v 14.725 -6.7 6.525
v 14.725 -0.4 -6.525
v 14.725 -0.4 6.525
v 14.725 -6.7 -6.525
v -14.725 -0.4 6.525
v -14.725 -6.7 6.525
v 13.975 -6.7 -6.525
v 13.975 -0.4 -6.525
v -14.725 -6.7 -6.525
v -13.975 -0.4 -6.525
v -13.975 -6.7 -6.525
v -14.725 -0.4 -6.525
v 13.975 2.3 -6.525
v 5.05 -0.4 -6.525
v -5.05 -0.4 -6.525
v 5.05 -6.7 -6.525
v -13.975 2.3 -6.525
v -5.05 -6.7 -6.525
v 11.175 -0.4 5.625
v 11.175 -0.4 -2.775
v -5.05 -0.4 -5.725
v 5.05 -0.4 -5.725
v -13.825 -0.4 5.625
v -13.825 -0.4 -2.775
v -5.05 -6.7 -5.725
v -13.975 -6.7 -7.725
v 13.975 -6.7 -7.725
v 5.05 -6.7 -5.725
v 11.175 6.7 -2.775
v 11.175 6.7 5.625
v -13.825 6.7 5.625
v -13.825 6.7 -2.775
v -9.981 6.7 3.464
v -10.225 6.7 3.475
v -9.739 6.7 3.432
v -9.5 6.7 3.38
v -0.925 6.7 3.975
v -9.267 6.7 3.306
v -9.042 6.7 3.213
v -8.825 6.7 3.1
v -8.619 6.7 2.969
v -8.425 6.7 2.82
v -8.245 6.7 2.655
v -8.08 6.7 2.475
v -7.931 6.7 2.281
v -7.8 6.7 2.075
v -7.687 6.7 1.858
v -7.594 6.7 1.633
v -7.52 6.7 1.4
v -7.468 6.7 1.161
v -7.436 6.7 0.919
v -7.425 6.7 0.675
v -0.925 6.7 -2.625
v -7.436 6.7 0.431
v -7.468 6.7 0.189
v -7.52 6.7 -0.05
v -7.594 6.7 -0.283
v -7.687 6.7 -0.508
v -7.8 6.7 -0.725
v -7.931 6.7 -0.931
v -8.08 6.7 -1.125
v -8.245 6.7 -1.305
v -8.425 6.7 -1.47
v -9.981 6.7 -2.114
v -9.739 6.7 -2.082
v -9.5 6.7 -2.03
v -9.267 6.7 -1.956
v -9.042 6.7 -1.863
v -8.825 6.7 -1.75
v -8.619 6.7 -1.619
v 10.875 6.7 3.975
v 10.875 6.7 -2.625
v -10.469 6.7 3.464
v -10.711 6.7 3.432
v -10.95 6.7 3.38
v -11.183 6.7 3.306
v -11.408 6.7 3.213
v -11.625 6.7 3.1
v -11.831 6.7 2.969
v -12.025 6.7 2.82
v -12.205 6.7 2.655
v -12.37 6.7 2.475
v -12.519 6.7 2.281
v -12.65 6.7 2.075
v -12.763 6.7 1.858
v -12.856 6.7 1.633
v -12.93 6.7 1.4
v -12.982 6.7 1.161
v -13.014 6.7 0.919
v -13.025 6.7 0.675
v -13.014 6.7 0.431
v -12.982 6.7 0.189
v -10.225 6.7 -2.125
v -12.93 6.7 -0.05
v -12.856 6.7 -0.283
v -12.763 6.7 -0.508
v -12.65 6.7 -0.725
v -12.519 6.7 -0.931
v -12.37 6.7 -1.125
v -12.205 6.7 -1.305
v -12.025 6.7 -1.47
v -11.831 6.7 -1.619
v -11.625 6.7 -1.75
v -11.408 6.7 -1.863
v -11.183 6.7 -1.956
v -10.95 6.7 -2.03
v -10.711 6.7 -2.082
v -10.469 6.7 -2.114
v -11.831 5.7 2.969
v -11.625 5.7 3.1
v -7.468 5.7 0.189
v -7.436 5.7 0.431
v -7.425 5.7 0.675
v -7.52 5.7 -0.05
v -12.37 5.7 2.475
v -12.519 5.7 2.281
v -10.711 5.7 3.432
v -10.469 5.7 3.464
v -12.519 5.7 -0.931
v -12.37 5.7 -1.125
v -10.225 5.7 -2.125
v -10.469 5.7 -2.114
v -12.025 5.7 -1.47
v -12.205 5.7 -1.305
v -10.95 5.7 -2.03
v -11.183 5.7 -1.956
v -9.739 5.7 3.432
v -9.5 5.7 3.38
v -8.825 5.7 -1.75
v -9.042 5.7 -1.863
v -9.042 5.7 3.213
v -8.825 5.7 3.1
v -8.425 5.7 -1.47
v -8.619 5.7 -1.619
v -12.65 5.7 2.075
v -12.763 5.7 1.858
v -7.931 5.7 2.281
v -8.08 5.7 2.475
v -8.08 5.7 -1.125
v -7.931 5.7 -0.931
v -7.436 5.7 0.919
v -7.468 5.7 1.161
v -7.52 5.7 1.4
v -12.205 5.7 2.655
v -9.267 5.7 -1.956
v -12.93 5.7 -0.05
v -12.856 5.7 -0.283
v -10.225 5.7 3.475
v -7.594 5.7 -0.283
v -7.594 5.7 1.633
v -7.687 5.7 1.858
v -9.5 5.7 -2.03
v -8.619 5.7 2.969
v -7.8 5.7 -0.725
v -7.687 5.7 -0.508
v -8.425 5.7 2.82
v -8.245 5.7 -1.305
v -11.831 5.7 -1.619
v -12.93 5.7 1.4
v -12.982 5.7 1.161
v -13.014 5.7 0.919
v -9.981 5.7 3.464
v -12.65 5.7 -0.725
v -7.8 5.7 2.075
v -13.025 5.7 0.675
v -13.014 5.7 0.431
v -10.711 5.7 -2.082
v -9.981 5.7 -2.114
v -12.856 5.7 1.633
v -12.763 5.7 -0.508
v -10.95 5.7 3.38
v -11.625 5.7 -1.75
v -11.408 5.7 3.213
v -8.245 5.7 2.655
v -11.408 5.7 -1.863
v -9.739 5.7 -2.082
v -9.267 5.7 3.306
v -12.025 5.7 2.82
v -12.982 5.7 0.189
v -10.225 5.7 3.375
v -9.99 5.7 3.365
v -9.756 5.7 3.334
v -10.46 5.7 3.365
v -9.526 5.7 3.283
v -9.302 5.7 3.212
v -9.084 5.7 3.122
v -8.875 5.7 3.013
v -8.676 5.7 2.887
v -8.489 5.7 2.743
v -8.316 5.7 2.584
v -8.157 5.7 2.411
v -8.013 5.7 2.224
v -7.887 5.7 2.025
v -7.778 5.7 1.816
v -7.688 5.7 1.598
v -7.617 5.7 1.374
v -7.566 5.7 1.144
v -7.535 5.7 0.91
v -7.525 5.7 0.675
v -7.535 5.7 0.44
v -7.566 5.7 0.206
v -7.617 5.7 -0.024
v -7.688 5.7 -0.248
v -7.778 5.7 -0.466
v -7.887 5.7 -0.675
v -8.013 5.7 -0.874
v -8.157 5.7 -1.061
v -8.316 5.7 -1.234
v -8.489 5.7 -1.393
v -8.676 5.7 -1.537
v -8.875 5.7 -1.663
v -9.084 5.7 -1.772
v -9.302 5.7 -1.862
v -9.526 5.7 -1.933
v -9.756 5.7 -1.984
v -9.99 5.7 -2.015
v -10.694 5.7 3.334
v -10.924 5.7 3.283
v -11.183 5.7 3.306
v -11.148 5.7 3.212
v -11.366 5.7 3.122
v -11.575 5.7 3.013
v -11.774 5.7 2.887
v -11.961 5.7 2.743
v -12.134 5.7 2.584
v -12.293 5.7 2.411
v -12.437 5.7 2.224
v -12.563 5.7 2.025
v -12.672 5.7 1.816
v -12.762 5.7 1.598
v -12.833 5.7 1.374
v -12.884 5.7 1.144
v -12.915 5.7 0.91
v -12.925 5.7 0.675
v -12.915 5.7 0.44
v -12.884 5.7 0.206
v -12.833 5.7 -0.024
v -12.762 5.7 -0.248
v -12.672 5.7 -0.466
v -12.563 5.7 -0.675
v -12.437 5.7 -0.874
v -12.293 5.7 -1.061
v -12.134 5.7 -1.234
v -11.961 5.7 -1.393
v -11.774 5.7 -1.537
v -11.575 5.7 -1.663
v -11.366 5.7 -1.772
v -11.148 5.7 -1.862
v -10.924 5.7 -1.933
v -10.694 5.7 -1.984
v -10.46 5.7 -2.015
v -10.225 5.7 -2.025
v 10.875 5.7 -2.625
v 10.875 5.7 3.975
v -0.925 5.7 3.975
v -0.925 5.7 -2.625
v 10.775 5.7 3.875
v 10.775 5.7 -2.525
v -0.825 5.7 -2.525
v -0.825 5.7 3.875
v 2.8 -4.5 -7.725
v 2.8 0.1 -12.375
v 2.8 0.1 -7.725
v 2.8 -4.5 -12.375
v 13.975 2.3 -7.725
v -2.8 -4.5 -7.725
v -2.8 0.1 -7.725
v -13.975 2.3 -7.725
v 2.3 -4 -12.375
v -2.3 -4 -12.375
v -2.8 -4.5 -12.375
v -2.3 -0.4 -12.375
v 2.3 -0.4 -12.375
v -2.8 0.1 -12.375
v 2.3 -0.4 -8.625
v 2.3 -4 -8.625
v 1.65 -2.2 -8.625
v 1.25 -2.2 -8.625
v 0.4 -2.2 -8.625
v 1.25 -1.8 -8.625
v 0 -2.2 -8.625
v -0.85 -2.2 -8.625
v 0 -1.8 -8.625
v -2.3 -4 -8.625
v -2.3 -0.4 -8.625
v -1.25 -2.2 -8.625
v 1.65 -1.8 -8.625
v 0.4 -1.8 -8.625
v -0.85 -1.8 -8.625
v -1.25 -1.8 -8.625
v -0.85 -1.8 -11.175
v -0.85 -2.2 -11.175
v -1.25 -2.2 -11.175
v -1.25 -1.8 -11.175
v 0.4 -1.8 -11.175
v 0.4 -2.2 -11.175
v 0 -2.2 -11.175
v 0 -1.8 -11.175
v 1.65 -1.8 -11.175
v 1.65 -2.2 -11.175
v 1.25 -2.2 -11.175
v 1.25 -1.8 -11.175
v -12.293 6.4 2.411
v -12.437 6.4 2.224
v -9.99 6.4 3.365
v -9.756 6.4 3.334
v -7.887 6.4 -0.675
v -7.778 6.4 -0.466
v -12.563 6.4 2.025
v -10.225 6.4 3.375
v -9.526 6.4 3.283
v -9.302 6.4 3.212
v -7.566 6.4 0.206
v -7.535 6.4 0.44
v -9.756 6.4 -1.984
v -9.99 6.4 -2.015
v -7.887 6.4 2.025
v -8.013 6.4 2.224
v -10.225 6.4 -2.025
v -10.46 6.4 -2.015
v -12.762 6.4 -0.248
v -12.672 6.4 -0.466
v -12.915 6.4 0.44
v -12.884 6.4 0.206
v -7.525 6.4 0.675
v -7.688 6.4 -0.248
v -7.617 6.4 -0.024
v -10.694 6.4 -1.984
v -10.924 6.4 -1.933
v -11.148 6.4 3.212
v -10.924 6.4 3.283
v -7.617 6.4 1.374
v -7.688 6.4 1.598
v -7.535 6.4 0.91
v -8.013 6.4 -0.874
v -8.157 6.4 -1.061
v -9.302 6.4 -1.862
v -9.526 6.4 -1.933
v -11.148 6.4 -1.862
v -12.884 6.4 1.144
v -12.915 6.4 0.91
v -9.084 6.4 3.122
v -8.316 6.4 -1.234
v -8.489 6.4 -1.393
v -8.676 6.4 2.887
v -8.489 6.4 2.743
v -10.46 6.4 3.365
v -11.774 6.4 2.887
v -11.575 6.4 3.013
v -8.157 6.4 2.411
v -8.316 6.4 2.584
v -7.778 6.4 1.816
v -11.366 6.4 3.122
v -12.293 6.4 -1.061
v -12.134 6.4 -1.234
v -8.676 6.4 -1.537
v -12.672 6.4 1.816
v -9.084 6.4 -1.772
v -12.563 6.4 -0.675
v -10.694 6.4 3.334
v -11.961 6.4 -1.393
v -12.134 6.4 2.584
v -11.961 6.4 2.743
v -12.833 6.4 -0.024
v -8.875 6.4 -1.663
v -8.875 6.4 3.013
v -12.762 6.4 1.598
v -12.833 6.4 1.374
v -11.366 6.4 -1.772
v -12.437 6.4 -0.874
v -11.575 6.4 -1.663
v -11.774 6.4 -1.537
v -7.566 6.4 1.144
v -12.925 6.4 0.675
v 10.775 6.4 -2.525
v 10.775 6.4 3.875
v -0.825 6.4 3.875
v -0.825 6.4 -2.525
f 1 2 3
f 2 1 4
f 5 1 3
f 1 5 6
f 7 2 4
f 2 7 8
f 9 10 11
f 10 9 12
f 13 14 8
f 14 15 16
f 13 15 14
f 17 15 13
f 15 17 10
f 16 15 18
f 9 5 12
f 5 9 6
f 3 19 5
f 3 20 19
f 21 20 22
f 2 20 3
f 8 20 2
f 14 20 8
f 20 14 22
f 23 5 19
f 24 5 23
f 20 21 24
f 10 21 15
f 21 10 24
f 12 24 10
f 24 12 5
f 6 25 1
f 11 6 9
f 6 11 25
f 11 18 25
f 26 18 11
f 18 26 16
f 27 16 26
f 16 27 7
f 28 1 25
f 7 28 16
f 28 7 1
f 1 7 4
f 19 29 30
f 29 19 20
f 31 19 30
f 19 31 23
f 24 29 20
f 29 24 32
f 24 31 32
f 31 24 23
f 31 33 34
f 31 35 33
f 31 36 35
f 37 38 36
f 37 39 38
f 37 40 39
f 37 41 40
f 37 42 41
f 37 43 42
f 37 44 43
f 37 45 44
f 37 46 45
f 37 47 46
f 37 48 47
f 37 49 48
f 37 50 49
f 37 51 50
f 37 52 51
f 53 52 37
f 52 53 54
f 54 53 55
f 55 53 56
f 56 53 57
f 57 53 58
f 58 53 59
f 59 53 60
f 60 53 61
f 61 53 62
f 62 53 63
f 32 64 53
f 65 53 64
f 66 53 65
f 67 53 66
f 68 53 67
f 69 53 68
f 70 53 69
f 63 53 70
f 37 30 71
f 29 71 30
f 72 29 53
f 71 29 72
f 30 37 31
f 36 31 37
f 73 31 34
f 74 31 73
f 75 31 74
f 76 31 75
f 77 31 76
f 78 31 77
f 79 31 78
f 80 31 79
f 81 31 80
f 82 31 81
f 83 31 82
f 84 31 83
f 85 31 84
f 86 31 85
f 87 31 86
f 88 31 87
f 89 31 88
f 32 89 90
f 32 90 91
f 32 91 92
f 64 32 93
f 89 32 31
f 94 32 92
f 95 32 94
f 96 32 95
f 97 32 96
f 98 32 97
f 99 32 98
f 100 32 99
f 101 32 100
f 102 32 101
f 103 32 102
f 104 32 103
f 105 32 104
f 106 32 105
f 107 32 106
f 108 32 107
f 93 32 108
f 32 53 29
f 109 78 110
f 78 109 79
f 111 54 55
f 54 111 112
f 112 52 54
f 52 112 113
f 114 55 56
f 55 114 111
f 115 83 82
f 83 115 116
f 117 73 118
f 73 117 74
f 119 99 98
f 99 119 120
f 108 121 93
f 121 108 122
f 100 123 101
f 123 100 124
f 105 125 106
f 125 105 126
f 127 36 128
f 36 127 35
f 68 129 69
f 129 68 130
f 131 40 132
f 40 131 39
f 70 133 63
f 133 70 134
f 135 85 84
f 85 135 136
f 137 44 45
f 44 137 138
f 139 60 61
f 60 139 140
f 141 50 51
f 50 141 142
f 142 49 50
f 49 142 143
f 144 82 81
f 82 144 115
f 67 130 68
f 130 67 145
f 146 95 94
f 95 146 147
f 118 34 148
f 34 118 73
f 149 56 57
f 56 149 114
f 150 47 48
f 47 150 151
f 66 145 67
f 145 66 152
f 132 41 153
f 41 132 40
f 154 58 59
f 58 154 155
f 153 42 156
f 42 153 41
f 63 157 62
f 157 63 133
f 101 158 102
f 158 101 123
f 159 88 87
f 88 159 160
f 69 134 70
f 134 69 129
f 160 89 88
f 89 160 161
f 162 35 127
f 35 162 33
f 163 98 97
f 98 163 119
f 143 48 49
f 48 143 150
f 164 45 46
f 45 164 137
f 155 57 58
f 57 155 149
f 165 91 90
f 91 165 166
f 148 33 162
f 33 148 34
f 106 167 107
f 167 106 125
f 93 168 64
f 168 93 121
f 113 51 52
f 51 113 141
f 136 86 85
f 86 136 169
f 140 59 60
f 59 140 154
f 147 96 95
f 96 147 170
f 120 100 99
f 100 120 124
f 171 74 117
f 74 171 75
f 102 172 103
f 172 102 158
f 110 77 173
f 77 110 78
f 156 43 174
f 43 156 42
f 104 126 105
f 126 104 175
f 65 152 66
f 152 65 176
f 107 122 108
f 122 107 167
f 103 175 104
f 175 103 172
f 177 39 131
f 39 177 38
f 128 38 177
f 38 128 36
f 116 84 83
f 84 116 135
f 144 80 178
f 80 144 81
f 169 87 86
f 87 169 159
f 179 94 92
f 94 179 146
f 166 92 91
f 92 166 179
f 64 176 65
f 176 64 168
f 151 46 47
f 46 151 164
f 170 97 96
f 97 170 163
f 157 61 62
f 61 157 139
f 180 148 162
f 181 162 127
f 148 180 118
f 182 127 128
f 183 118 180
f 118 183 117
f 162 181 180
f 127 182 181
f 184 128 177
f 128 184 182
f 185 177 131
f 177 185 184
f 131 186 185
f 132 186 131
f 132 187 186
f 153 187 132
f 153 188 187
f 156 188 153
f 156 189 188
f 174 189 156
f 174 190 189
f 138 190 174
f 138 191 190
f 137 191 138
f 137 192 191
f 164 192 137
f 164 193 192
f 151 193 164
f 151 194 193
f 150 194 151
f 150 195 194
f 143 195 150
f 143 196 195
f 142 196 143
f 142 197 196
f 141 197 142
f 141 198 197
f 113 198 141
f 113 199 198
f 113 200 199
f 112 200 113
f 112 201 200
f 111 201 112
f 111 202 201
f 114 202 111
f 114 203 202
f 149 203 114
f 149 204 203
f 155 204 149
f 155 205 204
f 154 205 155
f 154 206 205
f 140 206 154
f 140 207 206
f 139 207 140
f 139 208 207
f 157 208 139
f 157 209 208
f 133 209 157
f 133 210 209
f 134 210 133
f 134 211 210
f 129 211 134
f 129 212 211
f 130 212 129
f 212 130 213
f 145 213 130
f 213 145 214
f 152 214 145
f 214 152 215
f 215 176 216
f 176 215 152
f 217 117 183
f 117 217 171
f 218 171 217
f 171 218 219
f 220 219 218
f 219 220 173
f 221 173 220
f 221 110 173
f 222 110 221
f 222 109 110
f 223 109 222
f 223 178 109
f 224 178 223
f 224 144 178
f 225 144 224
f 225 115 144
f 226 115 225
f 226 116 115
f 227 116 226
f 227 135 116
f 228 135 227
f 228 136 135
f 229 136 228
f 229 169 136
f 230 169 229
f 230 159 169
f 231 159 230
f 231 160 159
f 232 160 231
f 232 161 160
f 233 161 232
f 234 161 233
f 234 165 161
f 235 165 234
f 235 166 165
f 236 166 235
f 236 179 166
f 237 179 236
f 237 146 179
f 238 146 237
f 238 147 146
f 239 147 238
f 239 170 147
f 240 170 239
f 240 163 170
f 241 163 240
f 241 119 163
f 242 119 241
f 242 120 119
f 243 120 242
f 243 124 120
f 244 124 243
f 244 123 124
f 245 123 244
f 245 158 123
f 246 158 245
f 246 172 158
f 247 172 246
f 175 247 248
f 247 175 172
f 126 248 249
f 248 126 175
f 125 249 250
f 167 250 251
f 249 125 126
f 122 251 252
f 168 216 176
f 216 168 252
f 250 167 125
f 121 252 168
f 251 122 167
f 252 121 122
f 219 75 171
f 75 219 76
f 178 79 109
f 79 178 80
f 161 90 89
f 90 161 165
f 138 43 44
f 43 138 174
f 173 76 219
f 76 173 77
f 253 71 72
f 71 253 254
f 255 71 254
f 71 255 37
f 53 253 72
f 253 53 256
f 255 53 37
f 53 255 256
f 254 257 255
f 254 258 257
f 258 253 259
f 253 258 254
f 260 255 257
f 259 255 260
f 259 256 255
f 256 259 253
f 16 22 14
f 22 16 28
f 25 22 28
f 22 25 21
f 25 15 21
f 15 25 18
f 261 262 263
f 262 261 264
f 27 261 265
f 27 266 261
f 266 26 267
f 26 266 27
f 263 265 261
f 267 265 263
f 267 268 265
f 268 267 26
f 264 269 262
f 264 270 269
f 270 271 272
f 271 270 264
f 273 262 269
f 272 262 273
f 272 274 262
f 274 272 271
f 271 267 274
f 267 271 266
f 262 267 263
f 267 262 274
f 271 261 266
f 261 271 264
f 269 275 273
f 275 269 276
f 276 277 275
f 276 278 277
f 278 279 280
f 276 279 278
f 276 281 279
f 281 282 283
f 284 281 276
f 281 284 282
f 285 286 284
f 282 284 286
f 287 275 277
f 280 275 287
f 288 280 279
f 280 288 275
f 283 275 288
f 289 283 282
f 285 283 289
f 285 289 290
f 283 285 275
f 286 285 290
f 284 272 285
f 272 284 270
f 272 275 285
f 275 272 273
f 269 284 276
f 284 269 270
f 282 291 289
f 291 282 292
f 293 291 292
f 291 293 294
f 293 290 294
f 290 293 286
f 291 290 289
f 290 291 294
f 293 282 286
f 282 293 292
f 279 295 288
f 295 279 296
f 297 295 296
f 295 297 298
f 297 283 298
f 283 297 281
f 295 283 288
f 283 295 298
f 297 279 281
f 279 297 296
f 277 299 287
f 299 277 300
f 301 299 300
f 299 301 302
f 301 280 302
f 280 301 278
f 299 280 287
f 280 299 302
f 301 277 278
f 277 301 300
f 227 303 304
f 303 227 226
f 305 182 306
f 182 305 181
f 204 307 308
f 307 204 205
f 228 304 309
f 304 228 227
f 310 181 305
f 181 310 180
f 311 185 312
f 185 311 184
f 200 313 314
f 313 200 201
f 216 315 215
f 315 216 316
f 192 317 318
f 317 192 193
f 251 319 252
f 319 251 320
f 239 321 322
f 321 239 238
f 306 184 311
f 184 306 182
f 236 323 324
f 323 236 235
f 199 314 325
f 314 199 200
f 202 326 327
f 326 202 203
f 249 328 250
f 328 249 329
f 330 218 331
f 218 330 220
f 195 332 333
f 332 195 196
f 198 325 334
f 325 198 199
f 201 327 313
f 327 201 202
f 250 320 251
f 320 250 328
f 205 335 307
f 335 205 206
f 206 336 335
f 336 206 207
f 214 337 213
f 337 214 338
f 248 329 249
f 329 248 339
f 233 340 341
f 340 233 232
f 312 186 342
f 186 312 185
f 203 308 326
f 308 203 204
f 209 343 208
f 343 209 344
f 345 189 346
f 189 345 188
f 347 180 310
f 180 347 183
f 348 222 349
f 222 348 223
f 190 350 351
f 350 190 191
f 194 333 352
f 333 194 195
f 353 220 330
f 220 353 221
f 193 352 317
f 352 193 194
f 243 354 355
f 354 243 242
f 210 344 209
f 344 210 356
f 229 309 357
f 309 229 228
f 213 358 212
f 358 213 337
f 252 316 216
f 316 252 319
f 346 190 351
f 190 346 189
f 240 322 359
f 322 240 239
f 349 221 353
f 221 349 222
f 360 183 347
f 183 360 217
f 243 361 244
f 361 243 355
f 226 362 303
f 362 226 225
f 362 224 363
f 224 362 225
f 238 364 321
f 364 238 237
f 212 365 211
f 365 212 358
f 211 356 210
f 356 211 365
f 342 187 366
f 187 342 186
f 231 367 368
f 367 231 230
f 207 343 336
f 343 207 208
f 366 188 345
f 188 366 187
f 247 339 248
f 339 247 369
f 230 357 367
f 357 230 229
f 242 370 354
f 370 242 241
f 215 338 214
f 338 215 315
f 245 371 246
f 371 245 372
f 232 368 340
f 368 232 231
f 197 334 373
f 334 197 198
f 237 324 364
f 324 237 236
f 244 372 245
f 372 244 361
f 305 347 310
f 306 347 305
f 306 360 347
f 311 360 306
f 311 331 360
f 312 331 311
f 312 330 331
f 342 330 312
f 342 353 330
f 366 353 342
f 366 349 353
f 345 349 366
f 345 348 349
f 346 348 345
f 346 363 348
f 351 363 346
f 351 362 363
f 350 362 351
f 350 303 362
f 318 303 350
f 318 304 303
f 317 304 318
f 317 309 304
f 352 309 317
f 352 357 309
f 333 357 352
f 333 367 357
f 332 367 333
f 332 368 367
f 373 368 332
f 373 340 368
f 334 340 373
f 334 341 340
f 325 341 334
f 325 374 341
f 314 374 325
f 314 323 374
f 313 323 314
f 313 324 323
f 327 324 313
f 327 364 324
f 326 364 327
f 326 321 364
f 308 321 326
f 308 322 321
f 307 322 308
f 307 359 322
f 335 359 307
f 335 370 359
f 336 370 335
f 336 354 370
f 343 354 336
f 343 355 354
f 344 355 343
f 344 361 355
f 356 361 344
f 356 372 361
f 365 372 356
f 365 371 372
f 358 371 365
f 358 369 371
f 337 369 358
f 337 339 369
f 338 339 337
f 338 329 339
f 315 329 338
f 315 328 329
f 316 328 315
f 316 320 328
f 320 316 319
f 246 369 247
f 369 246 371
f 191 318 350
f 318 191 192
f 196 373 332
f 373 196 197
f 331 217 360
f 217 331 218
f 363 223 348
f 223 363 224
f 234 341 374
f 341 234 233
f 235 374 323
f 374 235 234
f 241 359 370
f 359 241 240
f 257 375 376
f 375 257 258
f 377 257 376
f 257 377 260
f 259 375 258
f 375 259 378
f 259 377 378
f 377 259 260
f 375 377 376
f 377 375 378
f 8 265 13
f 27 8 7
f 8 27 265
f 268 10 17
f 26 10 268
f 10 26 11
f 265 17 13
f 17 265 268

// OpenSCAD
// ============================================================
//  SHARP GP2Y0D413K0F  Distance Measuring Sensor Unit
//  外形モデル (データシート 2 ページ目 "Outline Dimensions" より)
//    単位 : mm
//    原点 : 本体ケースの中心
//    +Y   : レンズ側(前面) / +Z : 上 (コネクタは下面)
//  Note1 "*" 印はレンズ中心位置寸法
//  Note2 一般公差 ±0.3
//  Note3 ( ) 内は参考寸法
// ============================================================

$fn = 72;

/* ---------------- 主要寸法 ---------------- */
case_w     = 29.45;   // ケース幅
case_h     = 13.05;   // ケース高さ (13.05)
case_d     =  6.30;   // (6.3)  ケース本体の奥行き
lc_d       =  7.10;   // 7.1±0.1 レンズケース(前面突出部)の奥行き
total_d    = case_d + lc_d;   // 13.4 ≒ 13.5 (全奥行き)
total_h    = 18.90;   // 18.9 +0.3/-0.3 (ケース上面～コネクタ下端)

lc_h       =  8.40;   // 8.4  レンズケース高さ
lc_bot     =  3.75;   // 3.75 ケース底面～レンズケース下端
lc_w       = 25.00;   // (参考) レンズケース幅
lc_x0      =  0.90;   // (参考) ケース左端～レンズケース左端

emit_x     =  4.50;   // *4.5   発光部レンズ中心 (ケース左端から)
det_x      = 19.70;   // *19.7  受光部レンズ中心 (ケース左端から)
lens_zb    =  7.20;   // 7.2  ケース底面(=PWB上面)～レンズ中心
                      //      (側面図の 8.4 は PWB 下面基準 : 8.4-7.2=1.2=PWB厚)

emit_dia   =  5.40;   // (参考) 発光部レンズ(円窓)径
det_w      = 11.60;   // (参考) 受光部レンズ(矩形窓)幅
det_h      =  6.40;   // (参考) 受光部レンズ(矩形窓)高さ
win_depth  =  1.00;   // (参考) 窓の彫り込み深さ
lens_set   =  0.30;   // (参考) レンズ面の引き込み量

pwb_t      =  1.20;   // 1.2  PWB(Paper phenol) 厚
pwb_w      = 27.95;   // 7.5 + 4.15 + 16.3
pwb_d      =  9.00;   // (参考) PWB 奥行き

// コネクタ : Shenglan Technology (JCTC) 12001W90-3P-HF (1.25mm ピッチ 3極 L型)
conn_w     =  5.60;   // (参考) ハウジング幅
conn_d     =  4.60;   // (参考) ハウジング奥行き
conn_pitch =  1.25;   // (参考) ピン間ピッチ
pin_sq     =  0.40;   // (参考) ピン角寸法
notch_w    = 10.10;   // 10.1 コネクタ部のケース逃げ幅

/* ---------------- 派生値 ---------------- */
x_l   = -case_w/2;            // ケース左端
y_b   = -total_d/2;           // 最背面
y_f   =  total_d/2;           // レンズケース前面
z_b   = -case_h/2;            // ケース底面
z_t   =  case_h/2;            // ケース上面

emit_cx = x_l + emit_x;
det_cx  = x_l + det_x;
lc_cx   = x_l + lc_x0 + lc_w/2;
lens_cz = z_b + lens_zb;

pwb_z1  = z_b;                // PWB 上面 (ケース底面)
pwb_z0  = z_b - pwb_t;        // PWB 下面
conn_h  = pwb_z0 - (z_t - total_h);   // = 4.65 (全高 18.9 に合わせる)
conn_y  = y_b + pwb_d/2;

/* ---------------- 窓の切り欠き ---------------- */
module emitter_cut(cl = 0){
    translate([emit_cx, y_f - win_depth, lens_cz])
        rotate([-90, 0, 0])
            cylinder(d = emit_dia + cl, h = win_depth + 0.2);
}

module detector_cut(cl = 0){
    translate([det_cx, y_f - win_depth/2 + 0.1, lens_cz])
        cube([det_w + cl, win_depth + 0.2, det_h + cl], center = true);
}

/* ---------------- ケース (Carbonic ABS) ---------------- */
module case_shell(){
    difference(){
        union(){
            // 本体ケース(概形は直方体)
            translate([0, y_b + case_d/2, 0])
                cube([case_w, case_d, case_h], center = true);
            // レンズケース(前面に飛び出す突起)
            translate([lc_cx, y_b + case_d + lc_d/2, z_b + lc_bot + lc_h/2])
                cube([lc_w, lc_d, lc_h], center = true);
        }
        // 2 つの窓
        emitter_cut(0.20);
        detector_cut(0.20);
        // コネクタ部の逃げ (10.1)
        translate([0, conn_y, z_b])
            cube([notch_w, pwb_d + 0.2, 1.6], center = true);
    }
}

/* ---------------- レンズ (Acrylic acid resin) ---------------- */
module lens_emitter(){          // 発光部 : 円形窓 (左側)
    translate([emit_cx, y_f - win_depth, lens_cz])
        rotate([-90, 0, 0])
            cylinder(d = emit_dia, h = win_depth - lens_set);
}

module lens_detector(){         // 受光部 : 矩形窓 (右側)
    translate([det_cx,
               y_f - win_depth + (win_depth - lens_set)/2,
               lens_cz])
        cube([det_w, win_depth - lens_set, det_h], center = true);
}

/* ---------------- PWB (Paper phenol) ---------------- */
module pwb(){
    translate([0, y_b + pwb_d/2, pwb_z0 + pwb_t/2])
        cube([pwb_w, pwb_d, pwb_t], center = true);
}

/* ---------------- コネクタ (JCTC 12001W90-3P-HF) ---------------- */
module connector(){
    // ハウジング (下向き開口の簡易表現)
    color("Ivory")
    difference(){
        translate([0, conn_y, pwb_z0 - conn_h/2])
            cube([conn_w, conn_d, conn_h], center = true);
        translate([0, conn_y, pwb_z0 - conn_h/2 - 0.5])
            cube([conn_w - 1.0, conn_d - 1.0, conn_h - 0.8], center = true);
    }
    // 端子 (1)Vo (2)GND (3)Vcc
    color("Goldenrod")
    for(i = [-1, 0, 1])
        translate([i * conn_pitch, conn_y, pwb_z0 - conn_h + 1.2])
            cube([pin_sq, pin_sq, conn_h * 0.75], center = false);
}

/* ---------------- 組み立て ---------------- */
module gp2y0d413k0f(){
    color("DimGray")   case_shell();     // Case : Carbonic ABS
    color([0.10, 0.10, 0.12]) lens_emitter();
    color([0.10, 0.10, 0.12]) lens_detector();
    color("DarkGreen") pwb();            // PWB  : Paper phenol
    connector();
}

gp2y0d413k0f();
